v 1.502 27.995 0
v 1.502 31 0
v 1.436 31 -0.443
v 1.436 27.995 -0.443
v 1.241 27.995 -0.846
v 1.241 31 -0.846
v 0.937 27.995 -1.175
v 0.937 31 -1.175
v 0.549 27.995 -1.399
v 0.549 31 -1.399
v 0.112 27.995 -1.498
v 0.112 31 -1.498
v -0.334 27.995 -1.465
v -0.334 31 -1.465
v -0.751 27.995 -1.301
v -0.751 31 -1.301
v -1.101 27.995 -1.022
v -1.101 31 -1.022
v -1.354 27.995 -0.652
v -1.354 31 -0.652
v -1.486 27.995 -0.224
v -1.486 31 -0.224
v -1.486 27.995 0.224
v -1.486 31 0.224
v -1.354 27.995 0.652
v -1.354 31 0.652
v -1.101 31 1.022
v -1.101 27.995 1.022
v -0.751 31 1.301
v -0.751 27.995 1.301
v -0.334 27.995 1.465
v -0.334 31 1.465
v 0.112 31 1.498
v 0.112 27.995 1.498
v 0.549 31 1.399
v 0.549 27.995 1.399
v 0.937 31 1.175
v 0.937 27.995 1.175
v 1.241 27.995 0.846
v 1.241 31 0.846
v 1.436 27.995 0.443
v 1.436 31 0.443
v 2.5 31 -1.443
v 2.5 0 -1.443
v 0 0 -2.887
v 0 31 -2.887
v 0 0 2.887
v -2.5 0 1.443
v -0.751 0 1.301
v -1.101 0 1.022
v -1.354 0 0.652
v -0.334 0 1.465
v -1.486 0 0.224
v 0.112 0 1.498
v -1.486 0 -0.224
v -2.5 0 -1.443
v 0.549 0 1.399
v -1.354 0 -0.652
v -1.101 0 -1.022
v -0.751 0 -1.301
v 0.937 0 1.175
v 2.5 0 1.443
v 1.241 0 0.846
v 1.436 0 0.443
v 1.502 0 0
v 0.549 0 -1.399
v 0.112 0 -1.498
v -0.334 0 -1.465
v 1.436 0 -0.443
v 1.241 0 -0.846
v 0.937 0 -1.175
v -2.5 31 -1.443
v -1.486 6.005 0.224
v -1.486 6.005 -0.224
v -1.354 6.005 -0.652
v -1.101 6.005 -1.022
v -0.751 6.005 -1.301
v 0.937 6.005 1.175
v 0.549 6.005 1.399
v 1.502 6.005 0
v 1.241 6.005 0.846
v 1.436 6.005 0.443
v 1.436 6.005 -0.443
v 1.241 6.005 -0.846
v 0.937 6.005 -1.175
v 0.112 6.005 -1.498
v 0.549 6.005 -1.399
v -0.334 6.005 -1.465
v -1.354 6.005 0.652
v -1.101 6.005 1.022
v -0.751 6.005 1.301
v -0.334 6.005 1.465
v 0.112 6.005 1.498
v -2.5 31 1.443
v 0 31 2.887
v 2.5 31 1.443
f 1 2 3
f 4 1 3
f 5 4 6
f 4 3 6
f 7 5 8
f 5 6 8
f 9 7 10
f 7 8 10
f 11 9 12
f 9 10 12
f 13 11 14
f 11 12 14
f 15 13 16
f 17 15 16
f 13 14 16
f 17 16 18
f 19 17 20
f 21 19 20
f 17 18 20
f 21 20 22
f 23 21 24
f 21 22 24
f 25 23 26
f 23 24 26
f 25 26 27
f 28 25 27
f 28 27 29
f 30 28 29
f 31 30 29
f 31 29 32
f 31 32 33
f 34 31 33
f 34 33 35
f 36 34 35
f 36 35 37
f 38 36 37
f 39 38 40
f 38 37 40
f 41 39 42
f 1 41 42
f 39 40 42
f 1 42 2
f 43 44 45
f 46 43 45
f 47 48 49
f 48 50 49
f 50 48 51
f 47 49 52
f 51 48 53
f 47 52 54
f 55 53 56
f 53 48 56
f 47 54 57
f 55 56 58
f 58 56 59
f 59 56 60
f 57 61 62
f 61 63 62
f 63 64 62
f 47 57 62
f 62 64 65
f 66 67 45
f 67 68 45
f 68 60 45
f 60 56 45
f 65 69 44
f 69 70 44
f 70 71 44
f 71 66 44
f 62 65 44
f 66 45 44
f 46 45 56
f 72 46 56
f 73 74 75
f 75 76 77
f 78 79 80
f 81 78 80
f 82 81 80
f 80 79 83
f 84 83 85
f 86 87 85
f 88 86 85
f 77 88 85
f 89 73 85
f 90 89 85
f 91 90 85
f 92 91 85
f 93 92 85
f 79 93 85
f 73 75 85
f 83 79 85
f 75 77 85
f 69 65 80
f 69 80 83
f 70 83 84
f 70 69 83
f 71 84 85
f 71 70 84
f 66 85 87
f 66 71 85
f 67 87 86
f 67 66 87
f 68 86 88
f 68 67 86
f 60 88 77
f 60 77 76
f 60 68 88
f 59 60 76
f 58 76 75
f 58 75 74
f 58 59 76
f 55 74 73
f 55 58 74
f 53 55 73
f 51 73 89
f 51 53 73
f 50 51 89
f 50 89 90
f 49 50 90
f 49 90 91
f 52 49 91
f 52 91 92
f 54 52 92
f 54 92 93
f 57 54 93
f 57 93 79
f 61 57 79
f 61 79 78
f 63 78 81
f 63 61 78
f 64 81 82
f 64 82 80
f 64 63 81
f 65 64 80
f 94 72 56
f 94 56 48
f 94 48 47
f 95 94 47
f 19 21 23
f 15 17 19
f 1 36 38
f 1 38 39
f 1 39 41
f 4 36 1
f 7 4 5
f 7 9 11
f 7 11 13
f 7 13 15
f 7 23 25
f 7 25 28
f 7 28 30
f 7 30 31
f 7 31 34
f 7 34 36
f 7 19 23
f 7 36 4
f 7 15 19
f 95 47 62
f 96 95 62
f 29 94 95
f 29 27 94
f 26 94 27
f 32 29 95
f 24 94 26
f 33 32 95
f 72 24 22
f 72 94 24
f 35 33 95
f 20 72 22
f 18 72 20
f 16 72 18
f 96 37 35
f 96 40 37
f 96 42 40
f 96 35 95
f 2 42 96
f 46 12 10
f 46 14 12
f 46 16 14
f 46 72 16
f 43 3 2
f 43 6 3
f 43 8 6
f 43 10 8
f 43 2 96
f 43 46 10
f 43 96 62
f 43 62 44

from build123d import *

# Parameters (mm, degrees)
BOSS_EXTRUDE1_DEPTH = 31
SKETCH2_R           = 1.5025
CUT_EXTRUDE1_DEPTH  = 6.005
SKETCH3_R           = 1.5025
CUT_EXTRUDE2_DEPTH  = 3.005


with BuildPart() as part:
    # Sketch1 → Boss-Extrude1 (new body)
    with BuildSketch(Plane(origin=(0, 0, 0), x_dir=(1, 0, 0), z_dir=(0, 1, 0))):
        Polygon((2.5, 1.443375673), (0, 2.886751346), (-2.5, 1.443375673), (-2.5, -1.443375673), (0, -2.886751346), (2.5, -1.443375673), align=None)
    extrude(amount=BOSS_EXTRUDE1_DEPTH)

    # Sketch2 → Cut-Extrude1 (cut)
    with BuildSketch(Plane(origin=(0, 0, 0), x_dir=(1, 0, 0), z_dir=(0, 1, 0))):
        Circle(SKETCH2_R)
    extrude(amount=CUT_EXTRUDE1_DEPTH, mode=Mode.SUBTRACT)

    # Sketch3 → Cut-Extrude2 (cut)
    with BuildSketch(Plane(origin=(0, 31, 0), x_dir=(1, 0, 0), z_dir=(0, 1, 0))):
        Circle(SKETCH3_R)
    extrude(amount=-CUT_EXTRUDE2_DEPTH, mode=Mode.SUBTRACT)


solid = part.part
